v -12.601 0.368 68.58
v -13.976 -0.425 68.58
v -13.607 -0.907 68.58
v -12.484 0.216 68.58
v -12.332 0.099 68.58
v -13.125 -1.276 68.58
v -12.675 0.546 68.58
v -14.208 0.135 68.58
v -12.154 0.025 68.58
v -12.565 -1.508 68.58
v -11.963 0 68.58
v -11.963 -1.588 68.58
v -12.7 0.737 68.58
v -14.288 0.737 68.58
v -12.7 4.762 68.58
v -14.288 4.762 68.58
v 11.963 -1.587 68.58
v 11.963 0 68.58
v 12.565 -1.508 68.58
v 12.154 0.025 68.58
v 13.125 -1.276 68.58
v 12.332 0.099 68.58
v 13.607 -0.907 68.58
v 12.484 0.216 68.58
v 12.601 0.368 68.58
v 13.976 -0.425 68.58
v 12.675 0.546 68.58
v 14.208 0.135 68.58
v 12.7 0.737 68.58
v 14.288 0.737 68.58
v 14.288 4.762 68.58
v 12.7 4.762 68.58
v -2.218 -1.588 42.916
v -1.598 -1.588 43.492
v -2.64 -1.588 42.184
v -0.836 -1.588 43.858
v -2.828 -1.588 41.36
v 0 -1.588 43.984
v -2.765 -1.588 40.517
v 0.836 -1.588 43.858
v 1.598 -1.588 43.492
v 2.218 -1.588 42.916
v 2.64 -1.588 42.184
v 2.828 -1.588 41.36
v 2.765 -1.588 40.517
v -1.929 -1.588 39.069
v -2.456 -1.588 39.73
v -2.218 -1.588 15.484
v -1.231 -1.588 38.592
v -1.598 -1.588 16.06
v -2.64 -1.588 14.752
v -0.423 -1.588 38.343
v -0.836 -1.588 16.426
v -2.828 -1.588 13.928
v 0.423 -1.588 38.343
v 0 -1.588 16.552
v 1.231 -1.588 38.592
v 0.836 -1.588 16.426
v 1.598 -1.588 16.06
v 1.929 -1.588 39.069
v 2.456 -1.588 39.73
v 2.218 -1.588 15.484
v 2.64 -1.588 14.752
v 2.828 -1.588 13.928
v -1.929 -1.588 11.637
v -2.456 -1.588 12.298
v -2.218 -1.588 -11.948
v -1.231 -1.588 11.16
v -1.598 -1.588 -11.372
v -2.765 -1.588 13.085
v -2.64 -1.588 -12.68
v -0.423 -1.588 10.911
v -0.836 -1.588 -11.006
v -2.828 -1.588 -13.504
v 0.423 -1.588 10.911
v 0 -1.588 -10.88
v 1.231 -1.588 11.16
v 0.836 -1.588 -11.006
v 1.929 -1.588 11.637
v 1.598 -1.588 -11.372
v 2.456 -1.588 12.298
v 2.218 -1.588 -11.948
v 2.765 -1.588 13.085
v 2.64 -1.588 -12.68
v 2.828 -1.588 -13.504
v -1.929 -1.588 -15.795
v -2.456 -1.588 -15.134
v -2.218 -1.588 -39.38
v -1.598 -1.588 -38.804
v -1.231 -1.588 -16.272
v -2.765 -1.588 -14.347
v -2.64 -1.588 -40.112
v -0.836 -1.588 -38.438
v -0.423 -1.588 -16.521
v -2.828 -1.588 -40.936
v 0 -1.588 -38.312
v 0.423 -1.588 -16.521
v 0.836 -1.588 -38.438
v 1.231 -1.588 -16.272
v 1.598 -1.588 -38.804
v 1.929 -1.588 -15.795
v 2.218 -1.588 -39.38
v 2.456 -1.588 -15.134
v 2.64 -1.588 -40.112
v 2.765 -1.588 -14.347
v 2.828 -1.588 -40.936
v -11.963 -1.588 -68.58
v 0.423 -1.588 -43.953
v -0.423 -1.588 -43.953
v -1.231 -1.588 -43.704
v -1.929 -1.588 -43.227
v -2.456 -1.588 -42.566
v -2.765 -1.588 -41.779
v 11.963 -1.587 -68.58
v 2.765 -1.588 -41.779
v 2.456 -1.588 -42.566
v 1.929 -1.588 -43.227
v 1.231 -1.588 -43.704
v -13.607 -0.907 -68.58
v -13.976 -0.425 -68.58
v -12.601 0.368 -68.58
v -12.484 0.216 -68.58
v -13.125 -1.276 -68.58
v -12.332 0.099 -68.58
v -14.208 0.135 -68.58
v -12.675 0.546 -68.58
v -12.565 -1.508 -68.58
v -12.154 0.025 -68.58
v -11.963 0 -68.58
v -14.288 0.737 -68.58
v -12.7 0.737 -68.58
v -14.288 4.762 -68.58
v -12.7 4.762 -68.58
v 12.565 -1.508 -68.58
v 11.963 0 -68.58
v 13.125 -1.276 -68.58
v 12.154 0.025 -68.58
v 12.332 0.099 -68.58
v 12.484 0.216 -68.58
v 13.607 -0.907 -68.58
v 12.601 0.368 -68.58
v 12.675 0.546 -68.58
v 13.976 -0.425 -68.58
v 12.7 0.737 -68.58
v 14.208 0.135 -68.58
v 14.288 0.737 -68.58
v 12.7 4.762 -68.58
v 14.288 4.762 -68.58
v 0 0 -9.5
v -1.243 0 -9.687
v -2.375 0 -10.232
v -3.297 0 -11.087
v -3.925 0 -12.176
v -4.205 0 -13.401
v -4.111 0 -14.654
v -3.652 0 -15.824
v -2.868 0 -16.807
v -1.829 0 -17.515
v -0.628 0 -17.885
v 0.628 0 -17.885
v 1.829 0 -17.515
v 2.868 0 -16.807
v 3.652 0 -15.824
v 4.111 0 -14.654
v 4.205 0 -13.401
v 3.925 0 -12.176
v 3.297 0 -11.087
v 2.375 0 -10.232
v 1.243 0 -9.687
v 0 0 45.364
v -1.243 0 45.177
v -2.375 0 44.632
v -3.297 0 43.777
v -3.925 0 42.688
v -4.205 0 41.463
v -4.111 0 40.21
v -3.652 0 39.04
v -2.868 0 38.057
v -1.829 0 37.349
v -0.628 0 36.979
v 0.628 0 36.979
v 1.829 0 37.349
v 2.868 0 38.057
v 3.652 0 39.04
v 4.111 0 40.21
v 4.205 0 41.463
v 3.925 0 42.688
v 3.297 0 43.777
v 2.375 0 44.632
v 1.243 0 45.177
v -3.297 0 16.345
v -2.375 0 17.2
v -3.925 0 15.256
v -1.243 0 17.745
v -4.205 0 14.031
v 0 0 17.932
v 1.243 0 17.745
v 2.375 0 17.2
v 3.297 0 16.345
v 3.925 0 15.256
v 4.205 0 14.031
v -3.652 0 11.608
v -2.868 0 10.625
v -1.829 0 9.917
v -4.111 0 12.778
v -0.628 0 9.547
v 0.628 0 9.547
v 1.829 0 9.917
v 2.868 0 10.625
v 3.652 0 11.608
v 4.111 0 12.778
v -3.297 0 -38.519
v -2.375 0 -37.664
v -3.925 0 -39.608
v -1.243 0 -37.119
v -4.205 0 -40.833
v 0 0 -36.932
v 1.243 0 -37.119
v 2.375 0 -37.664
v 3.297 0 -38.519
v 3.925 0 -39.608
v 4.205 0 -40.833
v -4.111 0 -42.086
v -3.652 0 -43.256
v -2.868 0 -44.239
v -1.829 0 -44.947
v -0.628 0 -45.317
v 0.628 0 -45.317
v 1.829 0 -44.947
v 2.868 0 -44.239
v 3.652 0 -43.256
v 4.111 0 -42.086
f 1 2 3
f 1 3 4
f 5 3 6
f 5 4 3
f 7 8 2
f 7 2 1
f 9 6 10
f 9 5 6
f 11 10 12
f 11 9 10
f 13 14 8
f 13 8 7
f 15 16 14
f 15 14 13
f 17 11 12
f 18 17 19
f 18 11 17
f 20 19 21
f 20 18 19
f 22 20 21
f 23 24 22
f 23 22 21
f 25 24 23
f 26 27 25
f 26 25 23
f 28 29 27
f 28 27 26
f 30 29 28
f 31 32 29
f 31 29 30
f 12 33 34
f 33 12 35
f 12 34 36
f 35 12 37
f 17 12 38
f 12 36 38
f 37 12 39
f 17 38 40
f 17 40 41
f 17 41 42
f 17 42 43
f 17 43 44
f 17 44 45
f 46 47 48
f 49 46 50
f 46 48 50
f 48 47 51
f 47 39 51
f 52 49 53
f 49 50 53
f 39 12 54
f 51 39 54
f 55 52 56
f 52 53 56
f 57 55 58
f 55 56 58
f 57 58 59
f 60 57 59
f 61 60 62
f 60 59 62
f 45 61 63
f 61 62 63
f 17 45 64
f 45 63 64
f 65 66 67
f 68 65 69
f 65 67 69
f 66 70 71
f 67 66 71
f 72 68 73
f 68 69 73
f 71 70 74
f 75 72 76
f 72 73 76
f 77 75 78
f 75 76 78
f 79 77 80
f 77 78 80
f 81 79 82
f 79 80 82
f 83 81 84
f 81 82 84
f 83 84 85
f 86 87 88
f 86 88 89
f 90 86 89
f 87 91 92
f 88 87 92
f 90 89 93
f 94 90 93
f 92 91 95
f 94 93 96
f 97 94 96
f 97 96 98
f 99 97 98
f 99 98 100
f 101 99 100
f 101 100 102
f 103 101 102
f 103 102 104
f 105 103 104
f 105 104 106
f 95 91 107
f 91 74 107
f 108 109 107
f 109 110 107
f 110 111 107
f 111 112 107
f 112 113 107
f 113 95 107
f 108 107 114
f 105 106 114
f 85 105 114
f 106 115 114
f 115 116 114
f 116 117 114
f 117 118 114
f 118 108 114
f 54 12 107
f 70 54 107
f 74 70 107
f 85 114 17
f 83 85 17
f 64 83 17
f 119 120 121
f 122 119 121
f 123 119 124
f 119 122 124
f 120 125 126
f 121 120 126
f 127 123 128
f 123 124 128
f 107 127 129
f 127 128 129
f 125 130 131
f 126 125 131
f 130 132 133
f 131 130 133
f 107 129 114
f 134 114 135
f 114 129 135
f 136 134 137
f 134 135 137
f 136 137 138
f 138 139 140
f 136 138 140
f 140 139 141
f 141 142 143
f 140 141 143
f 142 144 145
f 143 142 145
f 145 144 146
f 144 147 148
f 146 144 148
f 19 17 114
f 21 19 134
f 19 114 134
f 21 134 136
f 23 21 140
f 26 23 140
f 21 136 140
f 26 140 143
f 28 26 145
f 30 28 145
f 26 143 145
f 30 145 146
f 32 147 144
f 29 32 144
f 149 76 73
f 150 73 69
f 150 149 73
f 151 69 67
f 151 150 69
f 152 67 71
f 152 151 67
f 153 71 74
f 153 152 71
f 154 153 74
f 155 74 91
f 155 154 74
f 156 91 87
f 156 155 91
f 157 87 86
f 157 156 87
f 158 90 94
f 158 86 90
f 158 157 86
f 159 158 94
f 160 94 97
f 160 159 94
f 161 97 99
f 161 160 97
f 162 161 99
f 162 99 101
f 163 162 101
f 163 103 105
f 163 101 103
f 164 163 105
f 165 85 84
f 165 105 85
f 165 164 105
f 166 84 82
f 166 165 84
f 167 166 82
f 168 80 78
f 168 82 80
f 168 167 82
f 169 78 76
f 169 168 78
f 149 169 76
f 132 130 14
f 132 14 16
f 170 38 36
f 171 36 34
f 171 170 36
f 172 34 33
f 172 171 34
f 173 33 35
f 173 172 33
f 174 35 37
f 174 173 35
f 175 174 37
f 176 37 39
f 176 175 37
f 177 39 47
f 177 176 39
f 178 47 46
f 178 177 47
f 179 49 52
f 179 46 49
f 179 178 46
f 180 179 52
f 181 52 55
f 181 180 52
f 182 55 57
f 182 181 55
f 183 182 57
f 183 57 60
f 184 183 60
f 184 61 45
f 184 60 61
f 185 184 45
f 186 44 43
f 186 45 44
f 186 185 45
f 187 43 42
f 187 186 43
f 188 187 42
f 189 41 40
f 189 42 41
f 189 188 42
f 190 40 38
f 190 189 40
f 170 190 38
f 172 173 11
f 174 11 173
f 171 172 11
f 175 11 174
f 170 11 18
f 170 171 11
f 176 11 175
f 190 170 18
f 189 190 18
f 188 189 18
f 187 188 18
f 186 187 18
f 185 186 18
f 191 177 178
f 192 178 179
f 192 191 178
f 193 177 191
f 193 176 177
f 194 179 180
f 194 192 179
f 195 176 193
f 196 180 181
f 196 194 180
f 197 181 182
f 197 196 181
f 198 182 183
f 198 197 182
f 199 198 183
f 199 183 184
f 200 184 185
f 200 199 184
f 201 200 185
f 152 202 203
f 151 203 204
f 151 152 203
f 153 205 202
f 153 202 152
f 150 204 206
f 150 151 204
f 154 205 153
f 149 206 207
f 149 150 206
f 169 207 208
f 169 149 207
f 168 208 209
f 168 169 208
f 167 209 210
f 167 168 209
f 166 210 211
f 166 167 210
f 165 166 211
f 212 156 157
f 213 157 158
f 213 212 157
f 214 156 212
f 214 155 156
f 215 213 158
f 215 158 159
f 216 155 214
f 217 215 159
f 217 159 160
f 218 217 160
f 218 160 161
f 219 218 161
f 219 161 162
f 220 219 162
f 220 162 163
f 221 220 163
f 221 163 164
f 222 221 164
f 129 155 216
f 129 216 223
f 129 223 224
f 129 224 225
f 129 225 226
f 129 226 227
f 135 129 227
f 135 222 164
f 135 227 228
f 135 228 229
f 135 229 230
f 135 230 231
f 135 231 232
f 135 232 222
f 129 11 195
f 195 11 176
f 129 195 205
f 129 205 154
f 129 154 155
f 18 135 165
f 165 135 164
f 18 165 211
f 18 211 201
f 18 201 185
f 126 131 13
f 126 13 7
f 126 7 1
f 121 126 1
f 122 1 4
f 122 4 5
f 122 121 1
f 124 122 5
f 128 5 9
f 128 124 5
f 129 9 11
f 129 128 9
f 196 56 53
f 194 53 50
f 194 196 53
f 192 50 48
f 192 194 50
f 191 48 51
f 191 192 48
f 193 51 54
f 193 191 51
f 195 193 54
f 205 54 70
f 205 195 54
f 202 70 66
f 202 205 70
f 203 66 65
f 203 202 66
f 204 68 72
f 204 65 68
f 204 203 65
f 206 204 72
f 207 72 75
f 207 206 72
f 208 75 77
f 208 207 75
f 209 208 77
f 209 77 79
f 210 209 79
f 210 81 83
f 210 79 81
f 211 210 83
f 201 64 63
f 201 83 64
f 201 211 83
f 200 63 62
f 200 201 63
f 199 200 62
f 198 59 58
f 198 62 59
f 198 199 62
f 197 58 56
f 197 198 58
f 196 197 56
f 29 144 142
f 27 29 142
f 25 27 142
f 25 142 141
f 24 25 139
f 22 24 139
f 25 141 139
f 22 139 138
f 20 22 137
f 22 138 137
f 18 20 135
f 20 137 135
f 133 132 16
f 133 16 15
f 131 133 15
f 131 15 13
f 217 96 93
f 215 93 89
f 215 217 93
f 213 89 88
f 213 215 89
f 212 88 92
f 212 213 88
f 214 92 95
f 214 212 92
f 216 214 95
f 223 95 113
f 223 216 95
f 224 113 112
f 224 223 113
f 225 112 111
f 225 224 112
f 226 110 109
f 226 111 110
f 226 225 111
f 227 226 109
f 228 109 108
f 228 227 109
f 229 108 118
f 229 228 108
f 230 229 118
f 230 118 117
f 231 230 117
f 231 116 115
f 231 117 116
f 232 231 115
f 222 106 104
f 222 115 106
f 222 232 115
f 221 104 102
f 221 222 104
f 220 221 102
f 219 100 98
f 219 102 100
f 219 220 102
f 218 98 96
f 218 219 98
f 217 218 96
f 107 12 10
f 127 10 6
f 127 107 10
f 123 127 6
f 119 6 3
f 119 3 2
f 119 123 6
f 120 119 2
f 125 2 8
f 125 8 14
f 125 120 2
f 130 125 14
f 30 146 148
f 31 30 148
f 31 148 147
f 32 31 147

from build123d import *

# Parameters (mm, degrees)
SKETCH1_W                                     = 28.575
SKETCH1_H                                     = 137.16
BASE_FLANGE1_DEPTH                            = 1.5875
EDGE_FLANGE1_STRIP_W                          = 7.8232
EDGE_FLANGE1_STRIP_H                          = 1.5875
EDGE_FLANGE1_STRIP_CUT_DEPTH                  = 137.16
EDGE_FLANGE1_DEPTH                            = 137.16
CSK_FOR_8_FLAT_HEAD_MACHINE_SCREW1_AT_2_COUNT = 2
CSK_FOR_8_FLAT_HEAD_MACHINE_SCREW1_AT_2_PITCH = 27.432
CSK_FOR_8_FLAT_HEAD_MACHINE_SCREW1_AT_3_COUNT = 2
CSK_FOR_8_FLAT_HEAD_MACHINE_SCREW1_AT_3_PITCH = 54.864
CSK_FOR_8_FLAT_HEAD_MACHINE_SCREW1_AT_4_COUNT = 2
CSK_FOR_8_FLAT_HEAD_MACHINE_SCREW1_AT_4_PITCH = 82.296


# Sheet-metal steps are written as plain solids
with BuildPart() as part:
    # Sketch1 → Base-Flange1 (new body)
    with BuildSketch(Plane(origin=(0, 0, 0), x_dir=(1, 0, 0), z_dir=(0, 1, 0))):
        Rectangle(SKETCH1_W, SKETCH1_H)
    extrude(amount=-BASE_FLANGE1_DEPTH)

    # Edge-Flange1 strip (across the edge) → Edge-Flange1 strip cut (cut)
    with BuildSketch(Plane(origin=(-14.2875, 0, -68.58), x_dir=(1, 0, 0), z_dir=(0, 0, 1))):
        with Locations((-1.5875, -0.79375)):
            Rectangle(EDGE_FLANGE1_STRIP_W, EDGE_FLANGE1_STRIP_H)
    edge_flange1_strip_cut = extrude(amount=EDGE_FLANGE1_STRIP_CUT_DEPTH, mode=Mode.SUBTRACT)

    # Edge-Flange1 section (across the edge) → Edge-Flange1 (add)
    with BuildSketch(Plane(origin=(-14.2875, 0, -68.58), x_dir=(1, 0, 0), z_dir=(0, 0, 1))):
        with BuildLine():
            Line((0, 0.7366), (0, 4.7625))
            Line((0, 4.7625), (1.5875, 4.7625))
            Line((1.5875, 4.7625), (1.5875, 0.7366))
            ThreePointArc((1.5875, 0.7366), (1.803245145, 0.215745145), (2.3241, 0))
            Line((2.3241, 0), (2.3241, -1.5875))
            ThreePointArc((2.3241, -1.5875), (0.68071313, -0.90678687), (0, 0.7366))
        make_face()
    edge_flange1 = extrude(amount=EDGE_FLANGE1_DEPTH)

    # Mirror1: Edge-Flange1 strip cut, Edge-Flange1 across plane
    add(edge_flange1_strip_cut.mirror(Plane(origin=(0, 0, 0), x_dir=(0, 0, 1), z_dir=(1, 0, 0))), mode=Mode.SUBTRACT)
    add(edge_flange1.mirror(Plane(origin=(0, 0, 0), x_dir=(0, 0, 1), z_dir=(1, 0, 0))))

    # Sketch11 → CSK for #8 Flat Head Machine Screw1 (revolve, cut)
    with BuildSketch(Plane(origin=(0, 0, 41.148), x_dir=(0, 0, 1), z_dir=(1, 0, 0))):
        Polygon((0, 0), (0, 1.5875), (2.2479, 1.5875), (2.2479, 2.26450021), (4.2164, 0), align=None)
    csk_for_8_flat_head_machine_screw1 = revolve(axis=Axis((0, 6.35, 41.148), (0, -1, 0)), mode=Mode.SUBTRACT)

    # CSK for #8 Flat Head Machine Screw1 at 2: CSK for #8 Flat Head Machine Screw1 ×2
    with Locations(*[(0, 0, -i * CSK_FOR_8_FLAT_HEAD_MACHINE_SCREW1_AT_2_PITCH) for i in range(1, CSK_FOR_8_FLAT_HEAD_MACHINE_SCREW1_AT_2_COUNT)]):
        add(csk_for_8_flat_head_machine_screw1, mode=Mode.SUBTRACT)

    # CSK for #8 Flat Head Machine Screw1 at 3: CSK for #8 Flat Head Machine Screw1 ×2
    with Locations(*[(0, 0, -i * CSK_FOR_8_FLAT_HEAD_MACHINE_SCREW1_AT_3_PITCH) for i in range(1, CSK_FOR_8_FLAT_HEAD_MACHINE_SCREW1_AT_3_COUNT)]):
        add(csk_for_8_flat_head_machine_screw1, mode=Mode.SUBTRACT)

    # CSK for #8 Flat Head Machine Screw1 at 4: CSK for #8 Flat Head Machine Screw1 ×2
    with Locations(*[(0, 0, -i * CSK_FOR_8_FLAT_HEAD_MACHINE_SCREW1_AT_4_PITCH) for i in range(1, CSK_FOR_8_FLAT_HEAD_MACHINE_SCREW1_AT_4_COUNT)]):
        add(csk_for_8_flat_head_machine_screw1, mode=Mode.SUBTRACT)


solid = part.part
